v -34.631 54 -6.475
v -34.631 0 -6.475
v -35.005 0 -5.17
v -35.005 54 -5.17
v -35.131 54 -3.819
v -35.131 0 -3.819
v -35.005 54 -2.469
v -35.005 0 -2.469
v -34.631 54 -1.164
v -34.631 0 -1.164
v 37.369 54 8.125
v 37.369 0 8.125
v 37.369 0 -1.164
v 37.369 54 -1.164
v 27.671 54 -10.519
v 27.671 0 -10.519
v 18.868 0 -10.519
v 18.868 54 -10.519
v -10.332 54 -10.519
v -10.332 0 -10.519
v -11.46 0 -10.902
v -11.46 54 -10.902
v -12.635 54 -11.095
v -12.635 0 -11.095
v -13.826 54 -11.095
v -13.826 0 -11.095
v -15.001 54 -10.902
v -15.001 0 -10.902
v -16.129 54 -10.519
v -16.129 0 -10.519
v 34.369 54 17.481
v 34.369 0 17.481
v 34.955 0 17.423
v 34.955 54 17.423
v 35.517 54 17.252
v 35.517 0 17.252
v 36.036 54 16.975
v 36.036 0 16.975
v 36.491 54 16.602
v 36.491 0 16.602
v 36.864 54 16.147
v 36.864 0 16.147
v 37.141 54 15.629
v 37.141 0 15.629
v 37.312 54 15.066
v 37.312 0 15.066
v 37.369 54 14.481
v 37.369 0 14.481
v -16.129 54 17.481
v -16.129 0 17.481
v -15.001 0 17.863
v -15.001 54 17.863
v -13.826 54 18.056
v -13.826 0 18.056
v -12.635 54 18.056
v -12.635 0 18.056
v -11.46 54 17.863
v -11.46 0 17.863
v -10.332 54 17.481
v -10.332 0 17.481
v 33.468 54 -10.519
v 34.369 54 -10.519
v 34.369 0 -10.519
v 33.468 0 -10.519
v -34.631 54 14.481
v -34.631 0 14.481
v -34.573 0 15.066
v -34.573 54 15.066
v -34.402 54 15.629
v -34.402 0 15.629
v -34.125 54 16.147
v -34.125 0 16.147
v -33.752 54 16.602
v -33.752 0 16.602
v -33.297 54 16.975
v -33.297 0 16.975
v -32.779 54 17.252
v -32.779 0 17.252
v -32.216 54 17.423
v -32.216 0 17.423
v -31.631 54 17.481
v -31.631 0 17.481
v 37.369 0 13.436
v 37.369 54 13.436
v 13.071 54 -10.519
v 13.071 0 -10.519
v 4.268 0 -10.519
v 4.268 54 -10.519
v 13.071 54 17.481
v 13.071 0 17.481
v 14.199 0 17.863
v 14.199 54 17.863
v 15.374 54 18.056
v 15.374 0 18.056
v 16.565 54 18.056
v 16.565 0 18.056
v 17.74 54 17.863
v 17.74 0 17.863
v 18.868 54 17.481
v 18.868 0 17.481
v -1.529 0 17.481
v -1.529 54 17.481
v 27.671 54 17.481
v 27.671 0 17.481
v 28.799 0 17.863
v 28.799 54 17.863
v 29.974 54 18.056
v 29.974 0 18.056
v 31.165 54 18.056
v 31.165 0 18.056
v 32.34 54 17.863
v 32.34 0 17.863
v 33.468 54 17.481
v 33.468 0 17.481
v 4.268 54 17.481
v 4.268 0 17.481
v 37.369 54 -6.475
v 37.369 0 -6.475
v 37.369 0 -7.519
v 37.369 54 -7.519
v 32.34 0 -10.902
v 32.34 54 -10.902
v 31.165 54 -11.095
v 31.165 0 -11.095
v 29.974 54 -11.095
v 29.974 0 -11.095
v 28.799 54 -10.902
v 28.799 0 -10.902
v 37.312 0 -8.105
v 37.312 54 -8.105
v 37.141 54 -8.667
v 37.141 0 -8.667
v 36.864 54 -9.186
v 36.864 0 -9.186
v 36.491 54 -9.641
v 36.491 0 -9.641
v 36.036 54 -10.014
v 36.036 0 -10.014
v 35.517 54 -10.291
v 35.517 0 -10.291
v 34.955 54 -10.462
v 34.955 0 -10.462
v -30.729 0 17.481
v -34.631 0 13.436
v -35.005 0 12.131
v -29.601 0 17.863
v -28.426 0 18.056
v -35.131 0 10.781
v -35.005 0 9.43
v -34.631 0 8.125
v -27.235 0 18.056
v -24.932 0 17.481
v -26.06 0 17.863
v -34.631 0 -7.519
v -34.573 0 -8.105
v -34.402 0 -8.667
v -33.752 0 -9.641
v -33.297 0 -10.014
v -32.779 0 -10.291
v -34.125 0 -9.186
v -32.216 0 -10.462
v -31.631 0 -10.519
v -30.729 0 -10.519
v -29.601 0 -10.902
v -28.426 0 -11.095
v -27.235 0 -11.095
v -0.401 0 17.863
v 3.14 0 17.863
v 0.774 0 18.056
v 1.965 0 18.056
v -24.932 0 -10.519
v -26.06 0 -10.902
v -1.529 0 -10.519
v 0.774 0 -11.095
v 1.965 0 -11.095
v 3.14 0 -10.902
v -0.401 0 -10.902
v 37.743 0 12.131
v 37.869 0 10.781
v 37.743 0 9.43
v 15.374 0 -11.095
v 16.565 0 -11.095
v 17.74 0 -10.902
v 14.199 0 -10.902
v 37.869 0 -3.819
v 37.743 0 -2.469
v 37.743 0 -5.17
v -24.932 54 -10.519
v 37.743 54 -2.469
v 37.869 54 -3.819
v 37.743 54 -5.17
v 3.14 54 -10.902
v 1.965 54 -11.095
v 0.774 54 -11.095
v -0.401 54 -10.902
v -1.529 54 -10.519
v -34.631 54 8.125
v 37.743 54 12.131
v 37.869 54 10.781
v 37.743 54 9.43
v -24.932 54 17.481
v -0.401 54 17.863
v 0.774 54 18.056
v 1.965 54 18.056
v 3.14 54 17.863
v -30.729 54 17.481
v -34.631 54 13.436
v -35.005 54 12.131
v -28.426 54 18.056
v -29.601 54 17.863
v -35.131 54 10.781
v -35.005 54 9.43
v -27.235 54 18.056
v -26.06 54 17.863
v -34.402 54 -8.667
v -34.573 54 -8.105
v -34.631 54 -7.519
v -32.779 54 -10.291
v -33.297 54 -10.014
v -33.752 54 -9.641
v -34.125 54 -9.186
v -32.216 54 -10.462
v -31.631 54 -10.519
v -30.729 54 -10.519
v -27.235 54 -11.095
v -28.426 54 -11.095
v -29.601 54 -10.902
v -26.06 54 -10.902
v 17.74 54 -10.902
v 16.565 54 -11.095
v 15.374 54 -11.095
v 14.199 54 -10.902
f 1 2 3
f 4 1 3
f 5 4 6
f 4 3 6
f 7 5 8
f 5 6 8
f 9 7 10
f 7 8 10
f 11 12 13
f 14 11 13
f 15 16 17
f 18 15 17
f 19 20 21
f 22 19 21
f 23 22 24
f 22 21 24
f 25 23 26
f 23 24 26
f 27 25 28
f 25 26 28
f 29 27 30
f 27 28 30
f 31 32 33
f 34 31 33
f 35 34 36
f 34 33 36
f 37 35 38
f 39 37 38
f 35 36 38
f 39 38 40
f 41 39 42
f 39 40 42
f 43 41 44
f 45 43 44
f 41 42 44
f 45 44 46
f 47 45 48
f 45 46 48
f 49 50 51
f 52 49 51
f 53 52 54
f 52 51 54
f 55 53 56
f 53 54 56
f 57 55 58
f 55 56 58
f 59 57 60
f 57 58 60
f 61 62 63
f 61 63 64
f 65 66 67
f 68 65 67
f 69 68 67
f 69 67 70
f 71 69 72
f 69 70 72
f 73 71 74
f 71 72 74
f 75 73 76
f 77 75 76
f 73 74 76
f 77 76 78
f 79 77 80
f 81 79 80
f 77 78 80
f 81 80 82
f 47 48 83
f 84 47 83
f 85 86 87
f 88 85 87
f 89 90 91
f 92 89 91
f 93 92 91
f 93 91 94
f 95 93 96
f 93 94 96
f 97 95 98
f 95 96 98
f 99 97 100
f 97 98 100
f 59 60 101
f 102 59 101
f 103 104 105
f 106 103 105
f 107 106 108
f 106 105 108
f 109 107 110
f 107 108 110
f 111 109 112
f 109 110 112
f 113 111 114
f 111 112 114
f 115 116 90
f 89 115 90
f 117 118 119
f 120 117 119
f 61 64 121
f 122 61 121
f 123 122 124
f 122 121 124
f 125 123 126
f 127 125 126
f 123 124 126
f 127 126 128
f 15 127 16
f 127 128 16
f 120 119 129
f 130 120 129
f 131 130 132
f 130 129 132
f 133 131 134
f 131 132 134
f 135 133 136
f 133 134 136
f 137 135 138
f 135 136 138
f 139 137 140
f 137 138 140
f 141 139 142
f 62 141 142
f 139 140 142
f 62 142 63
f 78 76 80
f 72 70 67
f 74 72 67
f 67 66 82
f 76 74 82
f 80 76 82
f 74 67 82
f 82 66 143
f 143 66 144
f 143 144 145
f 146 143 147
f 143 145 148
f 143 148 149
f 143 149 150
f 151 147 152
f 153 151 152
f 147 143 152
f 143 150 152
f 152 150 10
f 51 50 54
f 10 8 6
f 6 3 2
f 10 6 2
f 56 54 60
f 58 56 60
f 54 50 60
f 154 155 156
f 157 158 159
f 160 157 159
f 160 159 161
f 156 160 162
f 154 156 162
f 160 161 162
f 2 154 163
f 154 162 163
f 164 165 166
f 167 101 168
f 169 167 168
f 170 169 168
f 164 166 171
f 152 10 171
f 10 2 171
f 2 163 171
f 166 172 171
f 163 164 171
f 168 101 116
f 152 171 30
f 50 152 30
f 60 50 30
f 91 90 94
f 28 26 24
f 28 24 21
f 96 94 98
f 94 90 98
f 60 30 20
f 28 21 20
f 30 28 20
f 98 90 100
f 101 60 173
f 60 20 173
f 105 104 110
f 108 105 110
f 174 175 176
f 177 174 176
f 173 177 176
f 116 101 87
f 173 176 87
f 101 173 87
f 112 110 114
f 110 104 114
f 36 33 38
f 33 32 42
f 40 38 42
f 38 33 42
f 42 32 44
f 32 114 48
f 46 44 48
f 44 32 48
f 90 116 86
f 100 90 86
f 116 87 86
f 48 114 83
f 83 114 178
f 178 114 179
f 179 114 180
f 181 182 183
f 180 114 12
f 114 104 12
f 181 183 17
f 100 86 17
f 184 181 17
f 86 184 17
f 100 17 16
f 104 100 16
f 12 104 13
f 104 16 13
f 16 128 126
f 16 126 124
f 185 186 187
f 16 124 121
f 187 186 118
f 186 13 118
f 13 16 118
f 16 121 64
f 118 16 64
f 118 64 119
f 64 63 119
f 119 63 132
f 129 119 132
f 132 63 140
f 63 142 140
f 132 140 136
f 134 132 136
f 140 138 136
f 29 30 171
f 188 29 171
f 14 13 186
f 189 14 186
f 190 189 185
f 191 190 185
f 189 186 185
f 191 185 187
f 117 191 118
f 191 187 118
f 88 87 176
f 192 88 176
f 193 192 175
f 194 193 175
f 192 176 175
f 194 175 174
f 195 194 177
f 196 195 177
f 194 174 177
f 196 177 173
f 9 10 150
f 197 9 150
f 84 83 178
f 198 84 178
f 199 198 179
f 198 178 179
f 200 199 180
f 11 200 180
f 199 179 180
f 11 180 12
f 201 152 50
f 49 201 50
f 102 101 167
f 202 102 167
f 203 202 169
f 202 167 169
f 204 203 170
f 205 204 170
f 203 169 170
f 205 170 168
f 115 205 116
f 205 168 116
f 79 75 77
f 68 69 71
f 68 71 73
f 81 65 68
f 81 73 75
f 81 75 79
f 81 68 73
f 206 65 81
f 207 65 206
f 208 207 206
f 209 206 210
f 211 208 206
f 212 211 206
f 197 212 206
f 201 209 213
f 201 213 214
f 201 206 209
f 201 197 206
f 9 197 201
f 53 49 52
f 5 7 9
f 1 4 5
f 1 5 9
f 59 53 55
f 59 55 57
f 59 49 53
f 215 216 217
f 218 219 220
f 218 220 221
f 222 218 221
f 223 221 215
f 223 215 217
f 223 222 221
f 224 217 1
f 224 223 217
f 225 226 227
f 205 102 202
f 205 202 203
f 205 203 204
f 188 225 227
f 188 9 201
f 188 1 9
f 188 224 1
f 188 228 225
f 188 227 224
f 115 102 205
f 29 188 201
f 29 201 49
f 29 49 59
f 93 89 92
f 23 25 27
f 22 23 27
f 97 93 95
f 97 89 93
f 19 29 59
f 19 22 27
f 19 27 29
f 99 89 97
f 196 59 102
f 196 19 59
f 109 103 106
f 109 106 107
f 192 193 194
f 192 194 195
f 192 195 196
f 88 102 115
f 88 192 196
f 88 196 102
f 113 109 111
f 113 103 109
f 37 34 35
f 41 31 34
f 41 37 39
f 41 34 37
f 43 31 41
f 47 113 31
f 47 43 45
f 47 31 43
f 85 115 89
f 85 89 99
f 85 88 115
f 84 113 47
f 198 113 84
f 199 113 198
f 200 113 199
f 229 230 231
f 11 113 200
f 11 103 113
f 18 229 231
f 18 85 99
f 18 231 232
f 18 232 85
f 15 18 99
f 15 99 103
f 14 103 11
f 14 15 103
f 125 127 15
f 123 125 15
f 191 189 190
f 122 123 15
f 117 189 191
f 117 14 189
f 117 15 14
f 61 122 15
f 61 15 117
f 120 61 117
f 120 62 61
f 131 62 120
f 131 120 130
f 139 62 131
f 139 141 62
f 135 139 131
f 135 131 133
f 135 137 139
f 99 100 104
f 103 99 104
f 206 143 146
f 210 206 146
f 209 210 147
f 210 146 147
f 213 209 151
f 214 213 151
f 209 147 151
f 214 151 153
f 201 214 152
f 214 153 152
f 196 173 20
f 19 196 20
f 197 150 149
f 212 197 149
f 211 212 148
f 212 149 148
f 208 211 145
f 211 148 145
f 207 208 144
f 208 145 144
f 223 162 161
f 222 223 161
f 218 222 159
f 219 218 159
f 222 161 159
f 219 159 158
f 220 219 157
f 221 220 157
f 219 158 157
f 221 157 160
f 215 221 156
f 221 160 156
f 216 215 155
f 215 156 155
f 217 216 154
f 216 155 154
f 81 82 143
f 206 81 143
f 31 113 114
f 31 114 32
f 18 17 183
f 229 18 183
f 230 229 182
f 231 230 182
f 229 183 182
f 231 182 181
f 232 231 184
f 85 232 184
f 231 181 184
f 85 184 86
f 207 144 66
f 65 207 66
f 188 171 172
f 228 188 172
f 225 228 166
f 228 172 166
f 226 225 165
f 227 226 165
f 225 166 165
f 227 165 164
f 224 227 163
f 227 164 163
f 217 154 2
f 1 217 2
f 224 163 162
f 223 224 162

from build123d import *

# Parameters (mm, degrees)
BOSS_EXTRUDE1_DEPTH = 54


with BuildPart() as part:
    # Sketch1 → Boss-Extrude1 (new body)
    with BuildSketch(Plane(origin=(0, 0, 0), x_dir=(1, 0, 0), z_dir=(0, 1, 0))):
        with BuildLine():
            ThreePointArc((-34.630594518, -14.480554015), (-33.751914861, -16.601874359), (-31.630594518, -17.480554015))
            Line((-31.630594518, -17.480554015), (-30.728869867, -17.480554015))
            ThreePointArc((-30.728869867, -17.480554015), (-27.830594518, -18.080554015), (-24.932319169, -17.480554015))
            Line((-24.932319169, -17.480554015), (-16.128869867, -17.480554015))
            ThreePointArc((-16.128869867, -17.480554015), (-13.230594518, -18.080554015), (-10.332319169, -17.480554015))
            Line((-10.332319169, -17.480554015), (-1.528869867, -17.480554015))
            ThreePointArc((-1.528869867, -17.480554015), (1.369405482, -18.080554015), (4.267680831, -17.480554015))
            Line((4.267680831, -17.480554015), (13.071130133, -17.480554015))
            ThreePointArc((13.071130133, -17.480554015), (15.969405482, -18.080554015), (18.867680831, -17.480554015))
            Line((18.867680831, -17.480554015), (27.671130133, -17.480554015))
            ThreePointArc((27.671130133, -17.480554015), (30.569405482, -18.080554015), (33.467680831, -17.480554015))
            Line((33.467680831, -17.480554015), (34.369405482, -17.480554015))
            ThreePointArc((34.369405482, -17.480554015), (36.490725826, -16.601874359), (37.369405482, -14.480554015))
            Line((37.369405482, -14.480554015), (37.369405482, -13.435737625))
            ThreePointArc((37.369405482, -13.435737625), (37.869405482, -10.780554015), (37.369405482, -8.125370406))
            Line((37.369405482, -8.125370406), (37.369405482, 1.164262375))
            ThreePointArc((37.369405482, 1.164262375), (37.869405482, 3.819445985), (37.369405482, 6.474629594))
            Line((37.369405482, 6.474629594), (37.369405482, 7.519445985))
            ThreePointArc((37.369405482, 7.519445985), (36.490725826, 9.640766328), (34.369405482, 10.519445985))
            Line((34.369405482, 10.519445985), (33.467680831, 10.519445985))
            ThreePointArc((33.467680831, 10.519445985), (30.569405482, 11.119445985), (27.671130133, 10.519445985))
            Line((27.671130133, 10.519445985), (18.867680831, 10.519445985))
            ThreePointArc((18.867680831, 10.519445985), (15.969405482, 11.119445985), (13.071130133, 10.519445985))
            Line((13.071130133, 10.519445985), (4.267680831, 10.519445985))
            ThreePointArc((4.267680831, 10.519445985), (1.369405482, 11.119445985), (-1.528869867, 10.519445985))
            Line((-1.528869867, 10.519445985), (-10.332319169, 10.519445985))
            ThreePointArc((-10.332319169, 10.519445985), (-13.230594518, 11.119445985), (-16.128869867, 10.519445985))
            Line((-16.128869867, 10.519445985), (-24.932319169, 10.519445985))
            ThreePointArc((-24.932319169, 10.519445985), (-27.830594518, 11.119445985), (-30.728869867, 10.519445985))
            Line((-30.728869867, 10.519445985), (-31.630594518, 10.519445985))
            ThreePointArc((-31.630594518, 10.519445985), (-33.751914861, 9.640766328), (-34.630594518, 7.519445985))
            Line((-34.630594518, 7.519445985), (-34.630594518, 6.474629594))
            ThreePointArc((-34.630594518, 6.474629594), (-35.130594518, 3.819445985), (-34.630594518, 1.164262375))
            Line((-34.630594518, 1.164262375), (-34.630594518, -8.125370406))
            ThreePointArc((-34.630594518, -8.125370406), (-35.130594518, -10.780554015), (-34.630594518, -13.435737625))
            Line((-34.630594518, -13.435737625), (-34.630594518, -14.480554015))
        make_face()
    extrude(amount=BOSS_EXTRUDE1_DEPTH)


solid = part.part
